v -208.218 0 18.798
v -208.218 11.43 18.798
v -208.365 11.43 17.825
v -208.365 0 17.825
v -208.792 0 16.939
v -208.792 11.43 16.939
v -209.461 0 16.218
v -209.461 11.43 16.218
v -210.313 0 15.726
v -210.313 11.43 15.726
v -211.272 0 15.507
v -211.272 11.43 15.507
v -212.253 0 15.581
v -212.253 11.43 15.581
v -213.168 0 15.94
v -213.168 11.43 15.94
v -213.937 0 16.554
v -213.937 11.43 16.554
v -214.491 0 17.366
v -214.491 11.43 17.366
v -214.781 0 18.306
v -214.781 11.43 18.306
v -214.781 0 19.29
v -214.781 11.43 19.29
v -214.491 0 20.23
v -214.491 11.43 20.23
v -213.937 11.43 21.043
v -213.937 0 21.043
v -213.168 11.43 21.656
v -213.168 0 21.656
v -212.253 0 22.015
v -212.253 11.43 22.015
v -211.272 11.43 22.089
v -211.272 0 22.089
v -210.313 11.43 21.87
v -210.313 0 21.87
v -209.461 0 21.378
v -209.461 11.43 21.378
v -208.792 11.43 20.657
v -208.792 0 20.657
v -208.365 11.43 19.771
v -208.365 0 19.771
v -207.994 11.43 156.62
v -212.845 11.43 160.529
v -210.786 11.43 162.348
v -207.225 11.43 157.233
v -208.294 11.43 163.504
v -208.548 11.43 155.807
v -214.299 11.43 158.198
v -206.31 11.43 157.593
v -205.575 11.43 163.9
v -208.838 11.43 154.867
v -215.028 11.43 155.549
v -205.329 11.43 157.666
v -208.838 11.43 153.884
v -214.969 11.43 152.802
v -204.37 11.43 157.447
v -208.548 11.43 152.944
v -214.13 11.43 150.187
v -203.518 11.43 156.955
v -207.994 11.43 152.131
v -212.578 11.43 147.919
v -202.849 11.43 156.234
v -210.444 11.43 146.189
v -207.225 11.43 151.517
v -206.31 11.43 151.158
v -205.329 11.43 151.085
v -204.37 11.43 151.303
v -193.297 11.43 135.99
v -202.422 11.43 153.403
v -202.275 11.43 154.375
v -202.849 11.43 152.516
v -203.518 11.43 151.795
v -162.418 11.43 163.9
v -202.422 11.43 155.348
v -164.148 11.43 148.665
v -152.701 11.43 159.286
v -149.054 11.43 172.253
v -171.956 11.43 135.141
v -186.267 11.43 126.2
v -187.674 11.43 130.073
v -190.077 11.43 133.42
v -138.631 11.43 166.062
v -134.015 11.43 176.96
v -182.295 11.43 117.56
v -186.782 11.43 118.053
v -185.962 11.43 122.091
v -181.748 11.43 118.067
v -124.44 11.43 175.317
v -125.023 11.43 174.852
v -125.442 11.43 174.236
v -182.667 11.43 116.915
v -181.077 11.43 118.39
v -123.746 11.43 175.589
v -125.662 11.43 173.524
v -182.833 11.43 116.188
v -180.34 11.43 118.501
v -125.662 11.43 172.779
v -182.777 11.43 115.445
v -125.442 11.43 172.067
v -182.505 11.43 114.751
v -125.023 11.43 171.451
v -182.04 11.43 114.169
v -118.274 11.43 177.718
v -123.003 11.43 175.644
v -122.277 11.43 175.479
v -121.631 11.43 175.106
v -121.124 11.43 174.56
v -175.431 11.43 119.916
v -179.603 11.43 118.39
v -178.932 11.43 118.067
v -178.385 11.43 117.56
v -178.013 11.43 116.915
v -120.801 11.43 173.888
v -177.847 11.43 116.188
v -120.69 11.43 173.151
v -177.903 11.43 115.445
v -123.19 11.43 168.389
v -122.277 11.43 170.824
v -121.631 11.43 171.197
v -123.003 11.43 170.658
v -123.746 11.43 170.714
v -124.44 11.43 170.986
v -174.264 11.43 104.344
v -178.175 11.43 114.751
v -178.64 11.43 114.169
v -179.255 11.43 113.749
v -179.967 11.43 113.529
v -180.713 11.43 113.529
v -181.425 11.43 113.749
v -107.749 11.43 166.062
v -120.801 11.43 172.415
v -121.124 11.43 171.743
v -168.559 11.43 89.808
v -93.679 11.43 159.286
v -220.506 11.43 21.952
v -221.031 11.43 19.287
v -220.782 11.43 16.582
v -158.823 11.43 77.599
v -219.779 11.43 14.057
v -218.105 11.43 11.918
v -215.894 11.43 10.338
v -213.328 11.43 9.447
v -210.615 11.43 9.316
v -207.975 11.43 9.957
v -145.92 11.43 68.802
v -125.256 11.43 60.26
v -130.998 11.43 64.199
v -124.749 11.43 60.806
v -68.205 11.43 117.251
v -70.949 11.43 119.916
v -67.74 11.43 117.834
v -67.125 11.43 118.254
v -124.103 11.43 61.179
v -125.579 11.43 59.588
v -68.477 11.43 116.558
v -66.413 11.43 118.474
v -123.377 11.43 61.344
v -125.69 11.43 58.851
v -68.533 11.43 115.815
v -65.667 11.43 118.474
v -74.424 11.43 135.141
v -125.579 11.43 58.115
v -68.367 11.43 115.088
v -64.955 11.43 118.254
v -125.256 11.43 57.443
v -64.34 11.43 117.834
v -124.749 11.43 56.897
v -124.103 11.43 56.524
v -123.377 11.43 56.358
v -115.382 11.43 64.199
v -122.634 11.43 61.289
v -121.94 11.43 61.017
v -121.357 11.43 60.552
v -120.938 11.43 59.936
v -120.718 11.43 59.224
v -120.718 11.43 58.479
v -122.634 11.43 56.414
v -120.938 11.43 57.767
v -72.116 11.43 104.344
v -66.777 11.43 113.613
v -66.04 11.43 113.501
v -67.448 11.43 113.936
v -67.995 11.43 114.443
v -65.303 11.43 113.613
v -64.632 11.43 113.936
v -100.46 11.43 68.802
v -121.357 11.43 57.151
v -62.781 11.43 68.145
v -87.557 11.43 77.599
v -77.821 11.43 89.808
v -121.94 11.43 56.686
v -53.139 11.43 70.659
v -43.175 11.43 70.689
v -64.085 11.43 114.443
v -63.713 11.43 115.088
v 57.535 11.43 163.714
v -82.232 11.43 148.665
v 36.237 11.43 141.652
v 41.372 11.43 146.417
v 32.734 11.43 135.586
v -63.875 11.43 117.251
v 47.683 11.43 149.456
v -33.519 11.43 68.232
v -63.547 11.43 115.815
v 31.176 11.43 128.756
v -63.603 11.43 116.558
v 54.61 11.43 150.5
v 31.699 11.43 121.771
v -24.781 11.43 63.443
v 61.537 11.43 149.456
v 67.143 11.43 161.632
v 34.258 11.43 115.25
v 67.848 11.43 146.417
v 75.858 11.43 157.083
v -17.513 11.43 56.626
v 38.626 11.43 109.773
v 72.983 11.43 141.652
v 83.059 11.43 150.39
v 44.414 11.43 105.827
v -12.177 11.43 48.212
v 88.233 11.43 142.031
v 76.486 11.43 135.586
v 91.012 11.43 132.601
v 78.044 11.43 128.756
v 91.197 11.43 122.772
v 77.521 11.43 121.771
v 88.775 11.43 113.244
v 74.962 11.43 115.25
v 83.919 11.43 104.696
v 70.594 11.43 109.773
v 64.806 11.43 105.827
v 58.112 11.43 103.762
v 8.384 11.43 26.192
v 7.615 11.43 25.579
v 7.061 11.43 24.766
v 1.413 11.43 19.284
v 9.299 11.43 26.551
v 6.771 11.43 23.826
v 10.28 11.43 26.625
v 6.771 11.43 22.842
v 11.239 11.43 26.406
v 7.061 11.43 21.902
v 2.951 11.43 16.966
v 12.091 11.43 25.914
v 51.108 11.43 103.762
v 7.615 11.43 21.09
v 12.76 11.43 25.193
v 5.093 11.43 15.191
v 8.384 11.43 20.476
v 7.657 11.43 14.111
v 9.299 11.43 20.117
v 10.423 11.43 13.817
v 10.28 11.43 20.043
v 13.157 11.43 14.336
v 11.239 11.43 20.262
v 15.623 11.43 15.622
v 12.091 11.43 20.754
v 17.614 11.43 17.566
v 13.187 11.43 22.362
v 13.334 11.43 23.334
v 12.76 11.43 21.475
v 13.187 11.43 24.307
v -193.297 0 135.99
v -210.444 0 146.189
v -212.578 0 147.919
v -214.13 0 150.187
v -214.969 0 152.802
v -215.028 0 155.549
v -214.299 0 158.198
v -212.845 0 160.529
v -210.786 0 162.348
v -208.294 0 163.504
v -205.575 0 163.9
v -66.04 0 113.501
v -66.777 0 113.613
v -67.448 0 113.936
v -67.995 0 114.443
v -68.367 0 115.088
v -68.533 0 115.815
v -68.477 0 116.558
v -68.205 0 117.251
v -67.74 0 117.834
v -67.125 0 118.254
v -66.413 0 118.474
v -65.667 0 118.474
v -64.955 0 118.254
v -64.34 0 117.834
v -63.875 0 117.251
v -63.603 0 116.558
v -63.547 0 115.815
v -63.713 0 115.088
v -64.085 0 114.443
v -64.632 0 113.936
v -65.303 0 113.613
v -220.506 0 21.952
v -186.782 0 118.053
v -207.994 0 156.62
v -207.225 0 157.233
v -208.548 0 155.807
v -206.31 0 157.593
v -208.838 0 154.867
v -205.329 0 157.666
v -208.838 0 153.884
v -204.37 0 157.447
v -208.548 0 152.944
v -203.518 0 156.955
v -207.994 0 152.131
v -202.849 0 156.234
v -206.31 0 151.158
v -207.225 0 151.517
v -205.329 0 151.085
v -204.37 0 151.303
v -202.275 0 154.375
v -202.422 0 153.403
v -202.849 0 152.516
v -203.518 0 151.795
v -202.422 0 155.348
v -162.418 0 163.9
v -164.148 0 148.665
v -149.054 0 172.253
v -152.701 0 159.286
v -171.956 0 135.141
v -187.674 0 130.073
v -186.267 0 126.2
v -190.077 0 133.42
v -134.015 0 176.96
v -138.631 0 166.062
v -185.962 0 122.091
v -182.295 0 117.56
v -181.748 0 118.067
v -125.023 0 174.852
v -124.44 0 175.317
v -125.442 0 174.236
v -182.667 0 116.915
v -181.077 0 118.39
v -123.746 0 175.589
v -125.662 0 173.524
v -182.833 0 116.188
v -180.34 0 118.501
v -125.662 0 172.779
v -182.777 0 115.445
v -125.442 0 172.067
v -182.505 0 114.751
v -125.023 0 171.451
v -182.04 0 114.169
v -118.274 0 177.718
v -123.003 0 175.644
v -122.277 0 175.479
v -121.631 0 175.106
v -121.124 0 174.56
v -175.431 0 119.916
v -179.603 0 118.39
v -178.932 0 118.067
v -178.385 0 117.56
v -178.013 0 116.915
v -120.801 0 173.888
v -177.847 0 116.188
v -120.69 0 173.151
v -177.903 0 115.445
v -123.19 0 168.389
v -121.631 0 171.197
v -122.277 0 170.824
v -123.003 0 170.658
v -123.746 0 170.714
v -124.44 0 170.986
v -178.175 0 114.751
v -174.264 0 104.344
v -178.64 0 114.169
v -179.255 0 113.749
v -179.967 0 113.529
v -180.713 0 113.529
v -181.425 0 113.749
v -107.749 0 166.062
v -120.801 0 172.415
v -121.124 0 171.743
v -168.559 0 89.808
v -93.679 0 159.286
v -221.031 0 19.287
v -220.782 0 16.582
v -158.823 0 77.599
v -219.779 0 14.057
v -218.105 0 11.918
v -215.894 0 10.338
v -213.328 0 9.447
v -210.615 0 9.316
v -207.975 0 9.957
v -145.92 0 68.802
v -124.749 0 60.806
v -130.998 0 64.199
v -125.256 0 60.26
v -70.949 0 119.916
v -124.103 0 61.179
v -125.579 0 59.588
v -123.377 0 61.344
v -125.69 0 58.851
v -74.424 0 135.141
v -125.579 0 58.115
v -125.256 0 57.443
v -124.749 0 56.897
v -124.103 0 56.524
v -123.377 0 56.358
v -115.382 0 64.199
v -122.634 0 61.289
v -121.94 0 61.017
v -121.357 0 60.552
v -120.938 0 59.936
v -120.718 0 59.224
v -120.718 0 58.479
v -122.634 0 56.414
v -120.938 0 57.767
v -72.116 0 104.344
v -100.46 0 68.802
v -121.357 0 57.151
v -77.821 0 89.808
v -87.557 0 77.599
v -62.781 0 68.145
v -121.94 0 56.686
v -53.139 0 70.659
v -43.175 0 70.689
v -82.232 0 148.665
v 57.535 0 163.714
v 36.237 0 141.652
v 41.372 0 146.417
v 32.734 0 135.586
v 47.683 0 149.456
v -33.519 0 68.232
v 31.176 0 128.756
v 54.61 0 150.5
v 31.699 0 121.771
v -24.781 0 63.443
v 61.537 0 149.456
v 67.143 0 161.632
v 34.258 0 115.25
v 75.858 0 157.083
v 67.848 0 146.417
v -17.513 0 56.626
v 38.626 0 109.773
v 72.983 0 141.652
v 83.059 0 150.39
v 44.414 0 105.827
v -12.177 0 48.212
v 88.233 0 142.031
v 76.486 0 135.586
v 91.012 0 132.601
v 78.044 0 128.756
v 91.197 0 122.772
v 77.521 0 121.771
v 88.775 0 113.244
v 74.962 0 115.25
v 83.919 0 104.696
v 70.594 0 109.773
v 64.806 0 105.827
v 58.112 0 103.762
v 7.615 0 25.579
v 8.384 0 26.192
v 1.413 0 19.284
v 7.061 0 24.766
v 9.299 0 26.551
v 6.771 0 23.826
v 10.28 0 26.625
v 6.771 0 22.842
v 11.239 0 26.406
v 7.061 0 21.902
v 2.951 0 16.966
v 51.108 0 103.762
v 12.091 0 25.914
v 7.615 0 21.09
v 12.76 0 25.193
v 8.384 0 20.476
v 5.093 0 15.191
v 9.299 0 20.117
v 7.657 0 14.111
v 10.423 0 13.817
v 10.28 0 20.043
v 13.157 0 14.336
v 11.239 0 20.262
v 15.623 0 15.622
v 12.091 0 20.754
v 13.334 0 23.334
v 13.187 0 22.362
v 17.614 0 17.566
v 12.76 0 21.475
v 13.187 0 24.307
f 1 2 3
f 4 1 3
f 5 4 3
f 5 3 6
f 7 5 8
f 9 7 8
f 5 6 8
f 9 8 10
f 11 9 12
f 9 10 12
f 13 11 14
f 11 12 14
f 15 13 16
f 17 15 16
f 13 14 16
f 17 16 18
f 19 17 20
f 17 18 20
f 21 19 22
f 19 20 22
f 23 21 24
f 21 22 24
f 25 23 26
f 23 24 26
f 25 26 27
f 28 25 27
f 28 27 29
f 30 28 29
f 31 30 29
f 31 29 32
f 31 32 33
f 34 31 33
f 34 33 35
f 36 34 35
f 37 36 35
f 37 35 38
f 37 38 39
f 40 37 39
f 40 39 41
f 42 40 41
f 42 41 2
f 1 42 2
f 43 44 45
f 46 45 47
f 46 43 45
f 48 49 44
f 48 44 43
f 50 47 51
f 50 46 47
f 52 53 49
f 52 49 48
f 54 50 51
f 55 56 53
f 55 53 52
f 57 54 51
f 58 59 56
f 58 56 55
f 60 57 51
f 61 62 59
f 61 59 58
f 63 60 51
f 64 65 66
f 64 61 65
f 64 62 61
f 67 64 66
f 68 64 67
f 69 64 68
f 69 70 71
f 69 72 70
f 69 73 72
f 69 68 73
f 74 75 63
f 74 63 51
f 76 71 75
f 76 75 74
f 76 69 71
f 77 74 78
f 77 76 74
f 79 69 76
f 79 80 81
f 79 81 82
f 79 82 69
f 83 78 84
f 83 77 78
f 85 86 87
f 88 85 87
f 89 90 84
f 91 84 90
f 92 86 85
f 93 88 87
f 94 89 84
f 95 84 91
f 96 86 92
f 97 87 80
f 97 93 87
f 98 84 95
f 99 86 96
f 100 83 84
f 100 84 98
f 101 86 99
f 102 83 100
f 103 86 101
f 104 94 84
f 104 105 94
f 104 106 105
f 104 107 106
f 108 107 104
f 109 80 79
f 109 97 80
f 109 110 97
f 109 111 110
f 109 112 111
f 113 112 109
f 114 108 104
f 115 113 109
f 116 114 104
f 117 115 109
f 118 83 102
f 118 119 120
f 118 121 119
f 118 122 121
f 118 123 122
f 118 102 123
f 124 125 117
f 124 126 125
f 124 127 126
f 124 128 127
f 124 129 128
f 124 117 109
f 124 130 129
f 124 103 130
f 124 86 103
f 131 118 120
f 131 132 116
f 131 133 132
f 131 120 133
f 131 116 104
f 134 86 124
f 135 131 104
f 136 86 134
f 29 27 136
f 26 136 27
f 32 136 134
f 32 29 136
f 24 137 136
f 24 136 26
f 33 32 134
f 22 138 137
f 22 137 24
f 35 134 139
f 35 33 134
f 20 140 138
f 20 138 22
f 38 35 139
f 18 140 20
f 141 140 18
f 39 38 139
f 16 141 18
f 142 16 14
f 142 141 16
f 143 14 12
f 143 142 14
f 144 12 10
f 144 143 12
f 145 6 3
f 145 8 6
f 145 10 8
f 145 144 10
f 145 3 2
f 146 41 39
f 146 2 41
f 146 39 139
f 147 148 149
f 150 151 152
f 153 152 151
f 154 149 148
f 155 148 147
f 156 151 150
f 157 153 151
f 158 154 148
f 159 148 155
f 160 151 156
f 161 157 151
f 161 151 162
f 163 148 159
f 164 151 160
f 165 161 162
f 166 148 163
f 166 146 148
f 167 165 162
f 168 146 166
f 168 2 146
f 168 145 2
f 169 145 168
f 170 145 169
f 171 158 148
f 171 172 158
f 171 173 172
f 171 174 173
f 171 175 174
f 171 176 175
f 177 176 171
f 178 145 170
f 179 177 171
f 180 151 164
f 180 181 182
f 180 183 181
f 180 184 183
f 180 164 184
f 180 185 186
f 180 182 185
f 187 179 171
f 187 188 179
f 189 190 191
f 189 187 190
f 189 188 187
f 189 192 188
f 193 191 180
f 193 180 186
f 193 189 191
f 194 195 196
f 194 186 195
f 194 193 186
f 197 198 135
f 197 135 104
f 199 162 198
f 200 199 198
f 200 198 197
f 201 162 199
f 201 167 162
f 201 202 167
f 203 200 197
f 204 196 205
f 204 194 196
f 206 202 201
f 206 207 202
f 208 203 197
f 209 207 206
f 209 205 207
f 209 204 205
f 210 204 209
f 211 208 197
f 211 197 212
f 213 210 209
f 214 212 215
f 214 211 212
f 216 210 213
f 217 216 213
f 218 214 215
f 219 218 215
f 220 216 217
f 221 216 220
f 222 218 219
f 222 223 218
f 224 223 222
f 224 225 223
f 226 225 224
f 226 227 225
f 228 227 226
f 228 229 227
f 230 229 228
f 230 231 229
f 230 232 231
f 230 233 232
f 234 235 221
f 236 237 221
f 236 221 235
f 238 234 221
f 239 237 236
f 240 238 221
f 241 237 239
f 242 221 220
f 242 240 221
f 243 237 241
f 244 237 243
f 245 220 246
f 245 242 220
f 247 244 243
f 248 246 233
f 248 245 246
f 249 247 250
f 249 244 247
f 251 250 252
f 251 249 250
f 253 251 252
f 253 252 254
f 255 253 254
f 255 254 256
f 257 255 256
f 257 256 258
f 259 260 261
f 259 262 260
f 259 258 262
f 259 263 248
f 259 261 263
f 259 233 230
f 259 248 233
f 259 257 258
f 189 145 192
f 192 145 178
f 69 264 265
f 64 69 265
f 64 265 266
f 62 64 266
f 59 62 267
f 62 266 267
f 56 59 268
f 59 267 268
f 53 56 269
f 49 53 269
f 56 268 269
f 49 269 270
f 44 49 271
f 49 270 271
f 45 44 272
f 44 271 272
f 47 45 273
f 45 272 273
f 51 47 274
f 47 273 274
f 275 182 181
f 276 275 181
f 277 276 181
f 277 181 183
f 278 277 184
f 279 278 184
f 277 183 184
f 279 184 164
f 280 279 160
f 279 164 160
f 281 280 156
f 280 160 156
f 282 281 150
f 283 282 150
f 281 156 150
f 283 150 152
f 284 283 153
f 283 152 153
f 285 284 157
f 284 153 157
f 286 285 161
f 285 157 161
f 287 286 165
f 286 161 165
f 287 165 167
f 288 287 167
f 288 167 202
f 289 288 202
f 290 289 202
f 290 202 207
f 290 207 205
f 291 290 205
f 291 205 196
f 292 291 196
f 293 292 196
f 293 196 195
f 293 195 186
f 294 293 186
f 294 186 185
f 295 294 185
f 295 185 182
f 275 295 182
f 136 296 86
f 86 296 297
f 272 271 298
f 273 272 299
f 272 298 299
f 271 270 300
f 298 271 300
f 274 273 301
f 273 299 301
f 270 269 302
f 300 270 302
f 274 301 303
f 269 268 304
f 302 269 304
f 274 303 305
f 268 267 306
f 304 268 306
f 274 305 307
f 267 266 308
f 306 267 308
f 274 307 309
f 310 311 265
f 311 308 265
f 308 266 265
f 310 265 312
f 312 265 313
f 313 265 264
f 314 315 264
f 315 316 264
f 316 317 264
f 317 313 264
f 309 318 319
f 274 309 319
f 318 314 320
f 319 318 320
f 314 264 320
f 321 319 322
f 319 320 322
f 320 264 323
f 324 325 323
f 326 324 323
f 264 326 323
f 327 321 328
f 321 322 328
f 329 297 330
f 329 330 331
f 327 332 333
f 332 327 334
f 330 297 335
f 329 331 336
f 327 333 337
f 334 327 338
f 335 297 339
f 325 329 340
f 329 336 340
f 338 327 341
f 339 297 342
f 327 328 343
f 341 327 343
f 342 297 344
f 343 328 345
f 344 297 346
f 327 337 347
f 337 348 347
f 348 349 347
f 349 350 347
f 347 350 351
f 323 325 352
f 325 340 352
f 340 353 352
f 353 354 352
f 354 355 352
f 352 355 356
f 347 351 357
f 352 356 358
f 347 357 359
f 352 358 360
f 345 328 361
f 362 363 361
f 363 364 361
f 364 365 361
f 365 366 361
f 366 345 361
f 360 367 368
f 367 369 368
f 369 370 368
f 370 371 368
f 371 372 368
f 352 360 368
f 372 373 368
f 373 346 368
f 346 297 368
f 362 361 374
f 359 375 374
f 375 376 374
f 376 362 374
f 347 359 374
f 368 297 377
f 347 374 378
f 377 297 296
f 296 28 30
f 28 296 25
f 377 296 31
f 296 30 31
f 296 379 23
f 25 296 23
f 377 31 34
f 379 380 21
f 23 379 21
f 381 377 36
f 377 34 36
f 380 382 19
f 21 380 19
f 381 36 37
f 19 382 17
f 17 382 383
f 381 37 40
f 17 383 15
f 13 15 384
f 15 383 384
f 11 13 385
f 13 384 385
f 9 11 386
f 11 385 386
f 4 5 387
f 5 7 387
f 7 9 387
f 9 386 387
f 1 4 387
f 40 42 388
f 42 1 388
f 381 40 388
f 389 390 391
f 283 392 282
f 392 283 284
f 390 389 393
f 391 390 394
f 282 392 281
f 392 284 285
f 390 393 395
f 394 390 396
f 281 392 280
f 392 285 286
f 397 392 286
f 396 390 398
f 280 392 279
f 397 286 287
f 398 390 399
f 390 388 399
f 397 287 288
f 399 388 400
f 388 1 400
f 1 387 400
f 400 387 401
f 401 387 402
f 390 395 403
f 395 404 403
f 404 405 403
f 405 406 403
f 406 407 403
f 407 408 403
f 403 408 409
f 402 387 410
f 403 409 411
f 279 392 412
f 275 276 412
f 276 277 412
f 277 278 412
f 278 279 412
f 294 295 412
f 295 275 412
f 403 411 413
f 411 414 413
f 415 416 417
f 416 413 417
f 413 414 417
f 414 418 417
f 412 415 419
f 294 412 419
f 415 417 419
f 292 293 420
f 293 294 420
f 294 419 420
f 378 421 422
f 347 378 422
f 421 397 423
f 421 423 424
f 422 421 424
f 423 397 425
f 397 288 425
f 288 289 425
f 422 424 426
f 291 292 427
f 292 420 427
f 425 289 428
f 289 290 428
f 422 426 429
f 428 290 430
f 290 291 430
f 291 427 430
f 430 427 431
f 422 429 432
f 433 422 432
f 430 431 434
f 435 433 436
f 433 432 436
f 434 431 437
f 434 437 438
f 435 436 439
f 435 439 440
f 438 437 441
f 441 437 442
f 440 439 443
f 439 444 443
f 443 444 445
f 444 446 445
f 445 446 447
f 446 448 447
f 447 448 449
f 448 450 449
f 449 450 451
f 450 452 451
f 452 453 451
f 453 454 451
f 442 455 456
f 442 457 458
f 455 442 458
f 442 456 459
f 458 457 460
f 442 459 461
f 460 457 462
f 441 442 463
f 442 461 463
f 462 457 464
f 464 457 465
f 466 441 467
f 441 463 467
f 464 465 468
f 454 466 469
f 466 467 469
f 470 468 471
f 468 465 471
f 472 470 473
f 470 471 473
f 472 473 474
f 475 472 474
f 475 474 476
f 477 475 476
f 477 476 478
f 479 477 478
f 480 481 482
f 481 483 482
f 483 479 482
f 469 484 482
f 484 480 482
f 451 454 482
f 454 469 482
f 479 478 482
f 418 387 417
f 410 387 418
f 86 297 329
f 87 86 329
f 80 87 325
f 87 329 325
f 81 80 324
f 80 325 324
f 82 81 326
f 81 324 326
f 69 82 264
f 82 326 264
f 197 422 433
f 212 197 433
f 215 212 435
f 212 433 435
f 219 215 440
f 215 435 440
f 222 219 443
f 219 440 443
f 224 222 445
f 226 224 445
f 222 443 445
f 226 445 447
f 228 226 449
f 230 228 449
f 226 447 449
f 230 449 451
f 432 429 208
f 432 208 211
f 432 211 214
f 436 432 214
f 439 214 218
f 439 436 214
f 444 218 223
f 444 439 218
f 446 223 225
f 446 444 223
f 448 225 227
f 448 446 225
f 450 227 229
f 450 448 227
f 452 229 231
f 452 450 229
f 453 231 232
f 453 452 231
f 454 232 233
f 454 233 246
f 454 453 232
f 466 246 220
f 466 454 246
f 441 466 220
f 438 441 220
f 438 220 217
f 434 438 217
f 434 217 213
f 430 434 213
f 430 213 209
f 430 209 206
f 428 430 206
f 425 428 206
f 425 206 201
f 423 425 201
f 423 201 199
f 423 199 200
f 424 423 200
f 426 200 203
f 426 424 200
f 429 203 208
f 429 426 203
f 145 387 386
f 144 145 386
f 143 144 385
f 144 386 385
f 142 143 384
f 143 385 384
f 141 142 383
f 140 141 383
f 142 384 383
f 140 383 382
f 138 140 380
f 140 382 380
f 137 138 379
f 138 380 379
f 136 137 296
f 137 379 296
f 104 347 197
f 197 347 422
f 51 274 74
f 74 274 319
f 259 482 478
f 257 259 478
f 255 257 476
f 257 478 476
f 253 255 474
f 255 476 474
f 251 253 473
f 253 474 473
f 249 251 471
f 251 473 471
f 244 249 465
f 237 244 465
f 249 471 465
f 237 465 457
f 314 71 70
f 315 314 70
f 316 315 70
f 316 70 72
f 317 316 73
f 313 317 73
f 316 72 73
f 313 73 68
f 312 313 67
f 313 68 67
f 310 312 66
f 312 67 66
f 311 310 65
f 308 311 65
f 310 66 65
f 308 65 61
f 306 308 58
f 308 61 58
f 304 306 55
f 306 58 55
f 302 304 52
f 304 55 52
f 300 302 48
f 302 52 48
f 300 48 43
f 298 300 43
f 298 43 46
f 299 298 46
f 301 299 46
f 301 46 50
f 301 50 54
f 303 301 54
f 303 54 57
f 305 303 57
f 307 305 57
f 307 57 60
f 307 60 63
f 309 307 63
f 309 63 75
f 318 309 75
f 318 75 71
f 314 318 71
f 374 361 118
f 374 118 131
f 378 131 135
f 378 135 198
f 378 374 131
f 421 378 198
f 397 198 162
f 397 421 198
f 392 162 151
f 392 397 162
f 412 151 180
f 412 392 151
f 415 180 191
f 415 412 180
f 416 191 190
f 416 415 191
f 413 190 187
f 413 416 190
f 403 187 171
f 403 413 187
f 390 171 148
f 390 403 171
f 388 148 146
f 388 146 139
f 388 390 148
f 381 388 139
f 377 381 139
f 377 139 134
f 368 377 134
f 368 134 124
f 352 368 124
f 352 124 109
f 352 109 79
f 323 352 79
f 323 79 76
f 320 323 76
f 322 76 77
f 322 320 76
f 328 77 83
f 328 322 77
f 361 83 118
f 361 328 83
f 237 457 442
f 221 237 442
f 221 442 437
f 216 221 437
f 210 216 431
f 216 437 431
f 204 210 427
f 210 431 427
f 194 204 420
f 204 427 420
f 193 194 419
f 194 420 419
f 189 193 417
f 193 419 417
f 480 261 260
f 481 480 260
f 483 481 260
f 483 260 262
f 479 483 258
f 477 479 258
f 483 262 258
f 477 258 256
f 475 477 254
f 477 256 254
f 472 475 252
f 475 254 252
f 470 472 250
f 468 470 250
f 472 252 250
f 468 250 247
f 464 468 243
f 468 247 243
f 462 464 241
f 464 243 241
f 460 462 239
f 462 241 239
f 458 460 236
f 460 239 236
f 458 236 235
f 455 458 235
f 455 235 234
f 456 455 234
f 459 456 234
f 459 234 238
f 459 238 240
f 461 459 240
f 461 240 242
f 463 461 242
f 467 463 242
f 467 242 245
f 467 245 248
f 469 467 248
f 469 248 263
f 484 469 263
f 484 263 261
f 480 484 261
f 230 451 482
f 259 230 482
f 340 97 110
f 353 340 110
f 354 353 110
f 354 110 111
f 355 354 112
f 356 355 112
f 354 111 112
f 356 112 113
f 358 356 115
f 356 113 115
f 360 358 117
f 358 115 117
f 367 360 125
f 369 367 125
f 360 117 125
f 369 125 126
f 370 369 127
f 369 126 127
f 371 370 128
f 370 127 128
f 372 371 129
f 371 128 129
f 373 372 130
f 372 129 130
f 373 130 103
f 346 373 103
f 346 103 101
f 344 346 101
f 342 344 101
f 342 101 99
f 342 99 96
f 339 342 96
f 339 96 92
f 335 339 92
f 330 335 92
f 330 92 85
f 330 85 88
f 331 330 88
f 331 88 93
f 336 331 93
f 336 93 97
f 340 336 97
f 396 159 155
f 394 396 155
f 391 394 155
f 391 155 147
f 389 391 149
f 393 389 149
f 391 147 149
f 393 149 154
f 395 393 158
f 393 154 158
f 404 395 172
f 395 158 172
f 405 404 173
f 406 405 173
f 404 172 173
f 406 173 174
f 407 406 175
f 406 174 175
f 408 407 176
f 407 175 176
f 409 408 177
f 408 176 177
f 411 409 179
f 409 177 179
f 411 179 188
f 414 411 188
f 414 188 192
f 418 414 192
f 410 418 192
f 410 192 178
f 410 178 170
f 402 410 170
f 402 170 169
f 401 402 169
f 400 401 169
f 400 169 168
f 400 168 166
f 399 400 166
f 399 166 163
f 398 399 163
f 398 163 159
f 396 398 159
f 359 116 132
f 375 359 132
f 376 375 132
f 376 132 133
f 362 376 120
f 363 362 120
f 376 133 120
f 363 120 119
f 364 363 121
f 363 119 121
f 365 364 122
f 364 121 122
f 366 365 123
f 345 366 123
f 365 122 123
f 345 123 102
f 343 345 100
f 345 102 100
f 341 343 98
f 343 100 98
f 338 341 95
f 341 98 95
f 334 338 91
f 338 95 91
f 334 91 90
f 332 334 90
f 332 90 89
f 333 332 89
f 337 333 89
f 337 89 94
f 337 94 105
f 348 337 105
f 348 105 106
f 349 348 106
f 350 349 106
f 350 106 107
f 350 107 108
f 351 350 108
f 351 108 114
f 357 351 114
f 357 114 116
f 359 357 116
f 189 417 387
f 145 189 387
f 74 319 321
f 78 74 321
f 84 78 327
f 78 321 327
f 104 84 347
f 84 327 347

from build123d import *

# Parameters (mm, degrees)
SKETCH1_R             = 52.3875
SKETCH1_R_2           = 23.5
BOSS_EXTRUDE1_DEPTH   = 11.43
M6_CLEARANCE_HOLE1_D  = 6.6
F_5_0MM_DOWEL_HOLE1_D = 5
CIRPATTERN1_COUNT     = 4


with BuildPart() as part:
    # Sketch1 → Boss-Extrude1 (new body)
    with BuildSketch(Plane(origin=(0, 0, 0), x_dir=(1, 0, 0), z_dir=(0, 1, 0))):
        with BuildLine():
            Line((-205.575185514, -163.900359311), (-162.418239385, -163.900359311))
            ThreePointArc((-162.418239385, -163.900359311), (-141.68491097, -175.086974107), (-118.273664056, -177.718470957))
            Line((-118.273664056, -177.718470957), (57.534589587, -163.713698748))
            ThreePointArc((57.534589587, -163.713698748), (88.232990974, -142.03141304), (83.918702981, -104.696439083))
            Line((83.918702981, -104.696439083), (17.613541845, -17.566035058))
            ThreePointArc((17.613541845, -17.566035058), (9.029109122, -13.862322556), (1.412558245, -19.284326264))
            Line((1.412558245, -19.284326264), (-12.176603989, -48.212200061))
            ThreePointArc((-12.176603989, -48.212200061), (-33.518744337, -68.231765471), (-62.780706514, -68.14502812))
            Line((-62.780706514, -68.14502812), (-207.974881785, -9.956762437))
            ThreePointArc((-207.974881785, -9.956762437), (-218.104712161, -11.917535088), (-220.5058623, -21.95210388))
            Line((-220.5058623, -21.95210388), (-186.782347933, -118.053350031))
            ThreePointArc((-186.782347933, -118.053350031), (-186.837480234, -128.184816063), (-193.296838451, -135.990348392))
            Line((-193.296838451, -135.990348392), (-210.444169906, -146.188869465))
            ThreePointArc((-210.444169906, -146.188869465), (-214.759463951, -156.900167147), (-205.575185514, -163.900359311))
        make_face()
        with Locations(Location((-123.19, -116.001477372, 0), (0, 0, 270))):
            Circle(SKETCH1_R, mode=Mode.SUBTRACT)
        with Locations(Location((54.61, -127, 0), (0, 0, 270))):
            Circle(SKETCH1_R_2, mode=Mode.SUBTRACT)
    extrude(amount=BOSS_EXTRUDE1_DEPTH)

    # M6 Clearance Hole1 (through all)
    with Locations(Plane(origin=(0, 0, 0), x_dir=(-1, 0, 0), z_dir=(0, -1, 0))):
        with Locations((-10.033704867, -23.334197365), (211.518182886, -18.798178744), (205.575185514, -154.375359311)):
            Hole(M6_CLEARANCE_HOLE1_D / 2)

    # Ø5.0mm Dowel Hole1 (through all)
    with Locations(Plane(origin=(0, 0, 0), x_dir=(-1, 0, 0), z_dir=(0, -1, 0))):
        with Locations((123.19, -173.151477372)):
            f_5_0mm_dowel_hole1 = Hole(F_5_0MM_DOWEL_HOLE1_D / 2)

    # CirPattern1: Ø5.0mm Dowel Hole1 ×4 about axis
    cirpattern1_axis = Axis((-123.19, 0, 116.001477372), (0, 1, 0))
    for i in range(1, CIRPATTERN1_COUNT):
        add(f_5_0mm_dowel_hole1.rotate(cirpattern1_axis, i * 360 / CIRPATTERN1_COUNT), mode=Mode.SUBTRACT)


solid = part.part
